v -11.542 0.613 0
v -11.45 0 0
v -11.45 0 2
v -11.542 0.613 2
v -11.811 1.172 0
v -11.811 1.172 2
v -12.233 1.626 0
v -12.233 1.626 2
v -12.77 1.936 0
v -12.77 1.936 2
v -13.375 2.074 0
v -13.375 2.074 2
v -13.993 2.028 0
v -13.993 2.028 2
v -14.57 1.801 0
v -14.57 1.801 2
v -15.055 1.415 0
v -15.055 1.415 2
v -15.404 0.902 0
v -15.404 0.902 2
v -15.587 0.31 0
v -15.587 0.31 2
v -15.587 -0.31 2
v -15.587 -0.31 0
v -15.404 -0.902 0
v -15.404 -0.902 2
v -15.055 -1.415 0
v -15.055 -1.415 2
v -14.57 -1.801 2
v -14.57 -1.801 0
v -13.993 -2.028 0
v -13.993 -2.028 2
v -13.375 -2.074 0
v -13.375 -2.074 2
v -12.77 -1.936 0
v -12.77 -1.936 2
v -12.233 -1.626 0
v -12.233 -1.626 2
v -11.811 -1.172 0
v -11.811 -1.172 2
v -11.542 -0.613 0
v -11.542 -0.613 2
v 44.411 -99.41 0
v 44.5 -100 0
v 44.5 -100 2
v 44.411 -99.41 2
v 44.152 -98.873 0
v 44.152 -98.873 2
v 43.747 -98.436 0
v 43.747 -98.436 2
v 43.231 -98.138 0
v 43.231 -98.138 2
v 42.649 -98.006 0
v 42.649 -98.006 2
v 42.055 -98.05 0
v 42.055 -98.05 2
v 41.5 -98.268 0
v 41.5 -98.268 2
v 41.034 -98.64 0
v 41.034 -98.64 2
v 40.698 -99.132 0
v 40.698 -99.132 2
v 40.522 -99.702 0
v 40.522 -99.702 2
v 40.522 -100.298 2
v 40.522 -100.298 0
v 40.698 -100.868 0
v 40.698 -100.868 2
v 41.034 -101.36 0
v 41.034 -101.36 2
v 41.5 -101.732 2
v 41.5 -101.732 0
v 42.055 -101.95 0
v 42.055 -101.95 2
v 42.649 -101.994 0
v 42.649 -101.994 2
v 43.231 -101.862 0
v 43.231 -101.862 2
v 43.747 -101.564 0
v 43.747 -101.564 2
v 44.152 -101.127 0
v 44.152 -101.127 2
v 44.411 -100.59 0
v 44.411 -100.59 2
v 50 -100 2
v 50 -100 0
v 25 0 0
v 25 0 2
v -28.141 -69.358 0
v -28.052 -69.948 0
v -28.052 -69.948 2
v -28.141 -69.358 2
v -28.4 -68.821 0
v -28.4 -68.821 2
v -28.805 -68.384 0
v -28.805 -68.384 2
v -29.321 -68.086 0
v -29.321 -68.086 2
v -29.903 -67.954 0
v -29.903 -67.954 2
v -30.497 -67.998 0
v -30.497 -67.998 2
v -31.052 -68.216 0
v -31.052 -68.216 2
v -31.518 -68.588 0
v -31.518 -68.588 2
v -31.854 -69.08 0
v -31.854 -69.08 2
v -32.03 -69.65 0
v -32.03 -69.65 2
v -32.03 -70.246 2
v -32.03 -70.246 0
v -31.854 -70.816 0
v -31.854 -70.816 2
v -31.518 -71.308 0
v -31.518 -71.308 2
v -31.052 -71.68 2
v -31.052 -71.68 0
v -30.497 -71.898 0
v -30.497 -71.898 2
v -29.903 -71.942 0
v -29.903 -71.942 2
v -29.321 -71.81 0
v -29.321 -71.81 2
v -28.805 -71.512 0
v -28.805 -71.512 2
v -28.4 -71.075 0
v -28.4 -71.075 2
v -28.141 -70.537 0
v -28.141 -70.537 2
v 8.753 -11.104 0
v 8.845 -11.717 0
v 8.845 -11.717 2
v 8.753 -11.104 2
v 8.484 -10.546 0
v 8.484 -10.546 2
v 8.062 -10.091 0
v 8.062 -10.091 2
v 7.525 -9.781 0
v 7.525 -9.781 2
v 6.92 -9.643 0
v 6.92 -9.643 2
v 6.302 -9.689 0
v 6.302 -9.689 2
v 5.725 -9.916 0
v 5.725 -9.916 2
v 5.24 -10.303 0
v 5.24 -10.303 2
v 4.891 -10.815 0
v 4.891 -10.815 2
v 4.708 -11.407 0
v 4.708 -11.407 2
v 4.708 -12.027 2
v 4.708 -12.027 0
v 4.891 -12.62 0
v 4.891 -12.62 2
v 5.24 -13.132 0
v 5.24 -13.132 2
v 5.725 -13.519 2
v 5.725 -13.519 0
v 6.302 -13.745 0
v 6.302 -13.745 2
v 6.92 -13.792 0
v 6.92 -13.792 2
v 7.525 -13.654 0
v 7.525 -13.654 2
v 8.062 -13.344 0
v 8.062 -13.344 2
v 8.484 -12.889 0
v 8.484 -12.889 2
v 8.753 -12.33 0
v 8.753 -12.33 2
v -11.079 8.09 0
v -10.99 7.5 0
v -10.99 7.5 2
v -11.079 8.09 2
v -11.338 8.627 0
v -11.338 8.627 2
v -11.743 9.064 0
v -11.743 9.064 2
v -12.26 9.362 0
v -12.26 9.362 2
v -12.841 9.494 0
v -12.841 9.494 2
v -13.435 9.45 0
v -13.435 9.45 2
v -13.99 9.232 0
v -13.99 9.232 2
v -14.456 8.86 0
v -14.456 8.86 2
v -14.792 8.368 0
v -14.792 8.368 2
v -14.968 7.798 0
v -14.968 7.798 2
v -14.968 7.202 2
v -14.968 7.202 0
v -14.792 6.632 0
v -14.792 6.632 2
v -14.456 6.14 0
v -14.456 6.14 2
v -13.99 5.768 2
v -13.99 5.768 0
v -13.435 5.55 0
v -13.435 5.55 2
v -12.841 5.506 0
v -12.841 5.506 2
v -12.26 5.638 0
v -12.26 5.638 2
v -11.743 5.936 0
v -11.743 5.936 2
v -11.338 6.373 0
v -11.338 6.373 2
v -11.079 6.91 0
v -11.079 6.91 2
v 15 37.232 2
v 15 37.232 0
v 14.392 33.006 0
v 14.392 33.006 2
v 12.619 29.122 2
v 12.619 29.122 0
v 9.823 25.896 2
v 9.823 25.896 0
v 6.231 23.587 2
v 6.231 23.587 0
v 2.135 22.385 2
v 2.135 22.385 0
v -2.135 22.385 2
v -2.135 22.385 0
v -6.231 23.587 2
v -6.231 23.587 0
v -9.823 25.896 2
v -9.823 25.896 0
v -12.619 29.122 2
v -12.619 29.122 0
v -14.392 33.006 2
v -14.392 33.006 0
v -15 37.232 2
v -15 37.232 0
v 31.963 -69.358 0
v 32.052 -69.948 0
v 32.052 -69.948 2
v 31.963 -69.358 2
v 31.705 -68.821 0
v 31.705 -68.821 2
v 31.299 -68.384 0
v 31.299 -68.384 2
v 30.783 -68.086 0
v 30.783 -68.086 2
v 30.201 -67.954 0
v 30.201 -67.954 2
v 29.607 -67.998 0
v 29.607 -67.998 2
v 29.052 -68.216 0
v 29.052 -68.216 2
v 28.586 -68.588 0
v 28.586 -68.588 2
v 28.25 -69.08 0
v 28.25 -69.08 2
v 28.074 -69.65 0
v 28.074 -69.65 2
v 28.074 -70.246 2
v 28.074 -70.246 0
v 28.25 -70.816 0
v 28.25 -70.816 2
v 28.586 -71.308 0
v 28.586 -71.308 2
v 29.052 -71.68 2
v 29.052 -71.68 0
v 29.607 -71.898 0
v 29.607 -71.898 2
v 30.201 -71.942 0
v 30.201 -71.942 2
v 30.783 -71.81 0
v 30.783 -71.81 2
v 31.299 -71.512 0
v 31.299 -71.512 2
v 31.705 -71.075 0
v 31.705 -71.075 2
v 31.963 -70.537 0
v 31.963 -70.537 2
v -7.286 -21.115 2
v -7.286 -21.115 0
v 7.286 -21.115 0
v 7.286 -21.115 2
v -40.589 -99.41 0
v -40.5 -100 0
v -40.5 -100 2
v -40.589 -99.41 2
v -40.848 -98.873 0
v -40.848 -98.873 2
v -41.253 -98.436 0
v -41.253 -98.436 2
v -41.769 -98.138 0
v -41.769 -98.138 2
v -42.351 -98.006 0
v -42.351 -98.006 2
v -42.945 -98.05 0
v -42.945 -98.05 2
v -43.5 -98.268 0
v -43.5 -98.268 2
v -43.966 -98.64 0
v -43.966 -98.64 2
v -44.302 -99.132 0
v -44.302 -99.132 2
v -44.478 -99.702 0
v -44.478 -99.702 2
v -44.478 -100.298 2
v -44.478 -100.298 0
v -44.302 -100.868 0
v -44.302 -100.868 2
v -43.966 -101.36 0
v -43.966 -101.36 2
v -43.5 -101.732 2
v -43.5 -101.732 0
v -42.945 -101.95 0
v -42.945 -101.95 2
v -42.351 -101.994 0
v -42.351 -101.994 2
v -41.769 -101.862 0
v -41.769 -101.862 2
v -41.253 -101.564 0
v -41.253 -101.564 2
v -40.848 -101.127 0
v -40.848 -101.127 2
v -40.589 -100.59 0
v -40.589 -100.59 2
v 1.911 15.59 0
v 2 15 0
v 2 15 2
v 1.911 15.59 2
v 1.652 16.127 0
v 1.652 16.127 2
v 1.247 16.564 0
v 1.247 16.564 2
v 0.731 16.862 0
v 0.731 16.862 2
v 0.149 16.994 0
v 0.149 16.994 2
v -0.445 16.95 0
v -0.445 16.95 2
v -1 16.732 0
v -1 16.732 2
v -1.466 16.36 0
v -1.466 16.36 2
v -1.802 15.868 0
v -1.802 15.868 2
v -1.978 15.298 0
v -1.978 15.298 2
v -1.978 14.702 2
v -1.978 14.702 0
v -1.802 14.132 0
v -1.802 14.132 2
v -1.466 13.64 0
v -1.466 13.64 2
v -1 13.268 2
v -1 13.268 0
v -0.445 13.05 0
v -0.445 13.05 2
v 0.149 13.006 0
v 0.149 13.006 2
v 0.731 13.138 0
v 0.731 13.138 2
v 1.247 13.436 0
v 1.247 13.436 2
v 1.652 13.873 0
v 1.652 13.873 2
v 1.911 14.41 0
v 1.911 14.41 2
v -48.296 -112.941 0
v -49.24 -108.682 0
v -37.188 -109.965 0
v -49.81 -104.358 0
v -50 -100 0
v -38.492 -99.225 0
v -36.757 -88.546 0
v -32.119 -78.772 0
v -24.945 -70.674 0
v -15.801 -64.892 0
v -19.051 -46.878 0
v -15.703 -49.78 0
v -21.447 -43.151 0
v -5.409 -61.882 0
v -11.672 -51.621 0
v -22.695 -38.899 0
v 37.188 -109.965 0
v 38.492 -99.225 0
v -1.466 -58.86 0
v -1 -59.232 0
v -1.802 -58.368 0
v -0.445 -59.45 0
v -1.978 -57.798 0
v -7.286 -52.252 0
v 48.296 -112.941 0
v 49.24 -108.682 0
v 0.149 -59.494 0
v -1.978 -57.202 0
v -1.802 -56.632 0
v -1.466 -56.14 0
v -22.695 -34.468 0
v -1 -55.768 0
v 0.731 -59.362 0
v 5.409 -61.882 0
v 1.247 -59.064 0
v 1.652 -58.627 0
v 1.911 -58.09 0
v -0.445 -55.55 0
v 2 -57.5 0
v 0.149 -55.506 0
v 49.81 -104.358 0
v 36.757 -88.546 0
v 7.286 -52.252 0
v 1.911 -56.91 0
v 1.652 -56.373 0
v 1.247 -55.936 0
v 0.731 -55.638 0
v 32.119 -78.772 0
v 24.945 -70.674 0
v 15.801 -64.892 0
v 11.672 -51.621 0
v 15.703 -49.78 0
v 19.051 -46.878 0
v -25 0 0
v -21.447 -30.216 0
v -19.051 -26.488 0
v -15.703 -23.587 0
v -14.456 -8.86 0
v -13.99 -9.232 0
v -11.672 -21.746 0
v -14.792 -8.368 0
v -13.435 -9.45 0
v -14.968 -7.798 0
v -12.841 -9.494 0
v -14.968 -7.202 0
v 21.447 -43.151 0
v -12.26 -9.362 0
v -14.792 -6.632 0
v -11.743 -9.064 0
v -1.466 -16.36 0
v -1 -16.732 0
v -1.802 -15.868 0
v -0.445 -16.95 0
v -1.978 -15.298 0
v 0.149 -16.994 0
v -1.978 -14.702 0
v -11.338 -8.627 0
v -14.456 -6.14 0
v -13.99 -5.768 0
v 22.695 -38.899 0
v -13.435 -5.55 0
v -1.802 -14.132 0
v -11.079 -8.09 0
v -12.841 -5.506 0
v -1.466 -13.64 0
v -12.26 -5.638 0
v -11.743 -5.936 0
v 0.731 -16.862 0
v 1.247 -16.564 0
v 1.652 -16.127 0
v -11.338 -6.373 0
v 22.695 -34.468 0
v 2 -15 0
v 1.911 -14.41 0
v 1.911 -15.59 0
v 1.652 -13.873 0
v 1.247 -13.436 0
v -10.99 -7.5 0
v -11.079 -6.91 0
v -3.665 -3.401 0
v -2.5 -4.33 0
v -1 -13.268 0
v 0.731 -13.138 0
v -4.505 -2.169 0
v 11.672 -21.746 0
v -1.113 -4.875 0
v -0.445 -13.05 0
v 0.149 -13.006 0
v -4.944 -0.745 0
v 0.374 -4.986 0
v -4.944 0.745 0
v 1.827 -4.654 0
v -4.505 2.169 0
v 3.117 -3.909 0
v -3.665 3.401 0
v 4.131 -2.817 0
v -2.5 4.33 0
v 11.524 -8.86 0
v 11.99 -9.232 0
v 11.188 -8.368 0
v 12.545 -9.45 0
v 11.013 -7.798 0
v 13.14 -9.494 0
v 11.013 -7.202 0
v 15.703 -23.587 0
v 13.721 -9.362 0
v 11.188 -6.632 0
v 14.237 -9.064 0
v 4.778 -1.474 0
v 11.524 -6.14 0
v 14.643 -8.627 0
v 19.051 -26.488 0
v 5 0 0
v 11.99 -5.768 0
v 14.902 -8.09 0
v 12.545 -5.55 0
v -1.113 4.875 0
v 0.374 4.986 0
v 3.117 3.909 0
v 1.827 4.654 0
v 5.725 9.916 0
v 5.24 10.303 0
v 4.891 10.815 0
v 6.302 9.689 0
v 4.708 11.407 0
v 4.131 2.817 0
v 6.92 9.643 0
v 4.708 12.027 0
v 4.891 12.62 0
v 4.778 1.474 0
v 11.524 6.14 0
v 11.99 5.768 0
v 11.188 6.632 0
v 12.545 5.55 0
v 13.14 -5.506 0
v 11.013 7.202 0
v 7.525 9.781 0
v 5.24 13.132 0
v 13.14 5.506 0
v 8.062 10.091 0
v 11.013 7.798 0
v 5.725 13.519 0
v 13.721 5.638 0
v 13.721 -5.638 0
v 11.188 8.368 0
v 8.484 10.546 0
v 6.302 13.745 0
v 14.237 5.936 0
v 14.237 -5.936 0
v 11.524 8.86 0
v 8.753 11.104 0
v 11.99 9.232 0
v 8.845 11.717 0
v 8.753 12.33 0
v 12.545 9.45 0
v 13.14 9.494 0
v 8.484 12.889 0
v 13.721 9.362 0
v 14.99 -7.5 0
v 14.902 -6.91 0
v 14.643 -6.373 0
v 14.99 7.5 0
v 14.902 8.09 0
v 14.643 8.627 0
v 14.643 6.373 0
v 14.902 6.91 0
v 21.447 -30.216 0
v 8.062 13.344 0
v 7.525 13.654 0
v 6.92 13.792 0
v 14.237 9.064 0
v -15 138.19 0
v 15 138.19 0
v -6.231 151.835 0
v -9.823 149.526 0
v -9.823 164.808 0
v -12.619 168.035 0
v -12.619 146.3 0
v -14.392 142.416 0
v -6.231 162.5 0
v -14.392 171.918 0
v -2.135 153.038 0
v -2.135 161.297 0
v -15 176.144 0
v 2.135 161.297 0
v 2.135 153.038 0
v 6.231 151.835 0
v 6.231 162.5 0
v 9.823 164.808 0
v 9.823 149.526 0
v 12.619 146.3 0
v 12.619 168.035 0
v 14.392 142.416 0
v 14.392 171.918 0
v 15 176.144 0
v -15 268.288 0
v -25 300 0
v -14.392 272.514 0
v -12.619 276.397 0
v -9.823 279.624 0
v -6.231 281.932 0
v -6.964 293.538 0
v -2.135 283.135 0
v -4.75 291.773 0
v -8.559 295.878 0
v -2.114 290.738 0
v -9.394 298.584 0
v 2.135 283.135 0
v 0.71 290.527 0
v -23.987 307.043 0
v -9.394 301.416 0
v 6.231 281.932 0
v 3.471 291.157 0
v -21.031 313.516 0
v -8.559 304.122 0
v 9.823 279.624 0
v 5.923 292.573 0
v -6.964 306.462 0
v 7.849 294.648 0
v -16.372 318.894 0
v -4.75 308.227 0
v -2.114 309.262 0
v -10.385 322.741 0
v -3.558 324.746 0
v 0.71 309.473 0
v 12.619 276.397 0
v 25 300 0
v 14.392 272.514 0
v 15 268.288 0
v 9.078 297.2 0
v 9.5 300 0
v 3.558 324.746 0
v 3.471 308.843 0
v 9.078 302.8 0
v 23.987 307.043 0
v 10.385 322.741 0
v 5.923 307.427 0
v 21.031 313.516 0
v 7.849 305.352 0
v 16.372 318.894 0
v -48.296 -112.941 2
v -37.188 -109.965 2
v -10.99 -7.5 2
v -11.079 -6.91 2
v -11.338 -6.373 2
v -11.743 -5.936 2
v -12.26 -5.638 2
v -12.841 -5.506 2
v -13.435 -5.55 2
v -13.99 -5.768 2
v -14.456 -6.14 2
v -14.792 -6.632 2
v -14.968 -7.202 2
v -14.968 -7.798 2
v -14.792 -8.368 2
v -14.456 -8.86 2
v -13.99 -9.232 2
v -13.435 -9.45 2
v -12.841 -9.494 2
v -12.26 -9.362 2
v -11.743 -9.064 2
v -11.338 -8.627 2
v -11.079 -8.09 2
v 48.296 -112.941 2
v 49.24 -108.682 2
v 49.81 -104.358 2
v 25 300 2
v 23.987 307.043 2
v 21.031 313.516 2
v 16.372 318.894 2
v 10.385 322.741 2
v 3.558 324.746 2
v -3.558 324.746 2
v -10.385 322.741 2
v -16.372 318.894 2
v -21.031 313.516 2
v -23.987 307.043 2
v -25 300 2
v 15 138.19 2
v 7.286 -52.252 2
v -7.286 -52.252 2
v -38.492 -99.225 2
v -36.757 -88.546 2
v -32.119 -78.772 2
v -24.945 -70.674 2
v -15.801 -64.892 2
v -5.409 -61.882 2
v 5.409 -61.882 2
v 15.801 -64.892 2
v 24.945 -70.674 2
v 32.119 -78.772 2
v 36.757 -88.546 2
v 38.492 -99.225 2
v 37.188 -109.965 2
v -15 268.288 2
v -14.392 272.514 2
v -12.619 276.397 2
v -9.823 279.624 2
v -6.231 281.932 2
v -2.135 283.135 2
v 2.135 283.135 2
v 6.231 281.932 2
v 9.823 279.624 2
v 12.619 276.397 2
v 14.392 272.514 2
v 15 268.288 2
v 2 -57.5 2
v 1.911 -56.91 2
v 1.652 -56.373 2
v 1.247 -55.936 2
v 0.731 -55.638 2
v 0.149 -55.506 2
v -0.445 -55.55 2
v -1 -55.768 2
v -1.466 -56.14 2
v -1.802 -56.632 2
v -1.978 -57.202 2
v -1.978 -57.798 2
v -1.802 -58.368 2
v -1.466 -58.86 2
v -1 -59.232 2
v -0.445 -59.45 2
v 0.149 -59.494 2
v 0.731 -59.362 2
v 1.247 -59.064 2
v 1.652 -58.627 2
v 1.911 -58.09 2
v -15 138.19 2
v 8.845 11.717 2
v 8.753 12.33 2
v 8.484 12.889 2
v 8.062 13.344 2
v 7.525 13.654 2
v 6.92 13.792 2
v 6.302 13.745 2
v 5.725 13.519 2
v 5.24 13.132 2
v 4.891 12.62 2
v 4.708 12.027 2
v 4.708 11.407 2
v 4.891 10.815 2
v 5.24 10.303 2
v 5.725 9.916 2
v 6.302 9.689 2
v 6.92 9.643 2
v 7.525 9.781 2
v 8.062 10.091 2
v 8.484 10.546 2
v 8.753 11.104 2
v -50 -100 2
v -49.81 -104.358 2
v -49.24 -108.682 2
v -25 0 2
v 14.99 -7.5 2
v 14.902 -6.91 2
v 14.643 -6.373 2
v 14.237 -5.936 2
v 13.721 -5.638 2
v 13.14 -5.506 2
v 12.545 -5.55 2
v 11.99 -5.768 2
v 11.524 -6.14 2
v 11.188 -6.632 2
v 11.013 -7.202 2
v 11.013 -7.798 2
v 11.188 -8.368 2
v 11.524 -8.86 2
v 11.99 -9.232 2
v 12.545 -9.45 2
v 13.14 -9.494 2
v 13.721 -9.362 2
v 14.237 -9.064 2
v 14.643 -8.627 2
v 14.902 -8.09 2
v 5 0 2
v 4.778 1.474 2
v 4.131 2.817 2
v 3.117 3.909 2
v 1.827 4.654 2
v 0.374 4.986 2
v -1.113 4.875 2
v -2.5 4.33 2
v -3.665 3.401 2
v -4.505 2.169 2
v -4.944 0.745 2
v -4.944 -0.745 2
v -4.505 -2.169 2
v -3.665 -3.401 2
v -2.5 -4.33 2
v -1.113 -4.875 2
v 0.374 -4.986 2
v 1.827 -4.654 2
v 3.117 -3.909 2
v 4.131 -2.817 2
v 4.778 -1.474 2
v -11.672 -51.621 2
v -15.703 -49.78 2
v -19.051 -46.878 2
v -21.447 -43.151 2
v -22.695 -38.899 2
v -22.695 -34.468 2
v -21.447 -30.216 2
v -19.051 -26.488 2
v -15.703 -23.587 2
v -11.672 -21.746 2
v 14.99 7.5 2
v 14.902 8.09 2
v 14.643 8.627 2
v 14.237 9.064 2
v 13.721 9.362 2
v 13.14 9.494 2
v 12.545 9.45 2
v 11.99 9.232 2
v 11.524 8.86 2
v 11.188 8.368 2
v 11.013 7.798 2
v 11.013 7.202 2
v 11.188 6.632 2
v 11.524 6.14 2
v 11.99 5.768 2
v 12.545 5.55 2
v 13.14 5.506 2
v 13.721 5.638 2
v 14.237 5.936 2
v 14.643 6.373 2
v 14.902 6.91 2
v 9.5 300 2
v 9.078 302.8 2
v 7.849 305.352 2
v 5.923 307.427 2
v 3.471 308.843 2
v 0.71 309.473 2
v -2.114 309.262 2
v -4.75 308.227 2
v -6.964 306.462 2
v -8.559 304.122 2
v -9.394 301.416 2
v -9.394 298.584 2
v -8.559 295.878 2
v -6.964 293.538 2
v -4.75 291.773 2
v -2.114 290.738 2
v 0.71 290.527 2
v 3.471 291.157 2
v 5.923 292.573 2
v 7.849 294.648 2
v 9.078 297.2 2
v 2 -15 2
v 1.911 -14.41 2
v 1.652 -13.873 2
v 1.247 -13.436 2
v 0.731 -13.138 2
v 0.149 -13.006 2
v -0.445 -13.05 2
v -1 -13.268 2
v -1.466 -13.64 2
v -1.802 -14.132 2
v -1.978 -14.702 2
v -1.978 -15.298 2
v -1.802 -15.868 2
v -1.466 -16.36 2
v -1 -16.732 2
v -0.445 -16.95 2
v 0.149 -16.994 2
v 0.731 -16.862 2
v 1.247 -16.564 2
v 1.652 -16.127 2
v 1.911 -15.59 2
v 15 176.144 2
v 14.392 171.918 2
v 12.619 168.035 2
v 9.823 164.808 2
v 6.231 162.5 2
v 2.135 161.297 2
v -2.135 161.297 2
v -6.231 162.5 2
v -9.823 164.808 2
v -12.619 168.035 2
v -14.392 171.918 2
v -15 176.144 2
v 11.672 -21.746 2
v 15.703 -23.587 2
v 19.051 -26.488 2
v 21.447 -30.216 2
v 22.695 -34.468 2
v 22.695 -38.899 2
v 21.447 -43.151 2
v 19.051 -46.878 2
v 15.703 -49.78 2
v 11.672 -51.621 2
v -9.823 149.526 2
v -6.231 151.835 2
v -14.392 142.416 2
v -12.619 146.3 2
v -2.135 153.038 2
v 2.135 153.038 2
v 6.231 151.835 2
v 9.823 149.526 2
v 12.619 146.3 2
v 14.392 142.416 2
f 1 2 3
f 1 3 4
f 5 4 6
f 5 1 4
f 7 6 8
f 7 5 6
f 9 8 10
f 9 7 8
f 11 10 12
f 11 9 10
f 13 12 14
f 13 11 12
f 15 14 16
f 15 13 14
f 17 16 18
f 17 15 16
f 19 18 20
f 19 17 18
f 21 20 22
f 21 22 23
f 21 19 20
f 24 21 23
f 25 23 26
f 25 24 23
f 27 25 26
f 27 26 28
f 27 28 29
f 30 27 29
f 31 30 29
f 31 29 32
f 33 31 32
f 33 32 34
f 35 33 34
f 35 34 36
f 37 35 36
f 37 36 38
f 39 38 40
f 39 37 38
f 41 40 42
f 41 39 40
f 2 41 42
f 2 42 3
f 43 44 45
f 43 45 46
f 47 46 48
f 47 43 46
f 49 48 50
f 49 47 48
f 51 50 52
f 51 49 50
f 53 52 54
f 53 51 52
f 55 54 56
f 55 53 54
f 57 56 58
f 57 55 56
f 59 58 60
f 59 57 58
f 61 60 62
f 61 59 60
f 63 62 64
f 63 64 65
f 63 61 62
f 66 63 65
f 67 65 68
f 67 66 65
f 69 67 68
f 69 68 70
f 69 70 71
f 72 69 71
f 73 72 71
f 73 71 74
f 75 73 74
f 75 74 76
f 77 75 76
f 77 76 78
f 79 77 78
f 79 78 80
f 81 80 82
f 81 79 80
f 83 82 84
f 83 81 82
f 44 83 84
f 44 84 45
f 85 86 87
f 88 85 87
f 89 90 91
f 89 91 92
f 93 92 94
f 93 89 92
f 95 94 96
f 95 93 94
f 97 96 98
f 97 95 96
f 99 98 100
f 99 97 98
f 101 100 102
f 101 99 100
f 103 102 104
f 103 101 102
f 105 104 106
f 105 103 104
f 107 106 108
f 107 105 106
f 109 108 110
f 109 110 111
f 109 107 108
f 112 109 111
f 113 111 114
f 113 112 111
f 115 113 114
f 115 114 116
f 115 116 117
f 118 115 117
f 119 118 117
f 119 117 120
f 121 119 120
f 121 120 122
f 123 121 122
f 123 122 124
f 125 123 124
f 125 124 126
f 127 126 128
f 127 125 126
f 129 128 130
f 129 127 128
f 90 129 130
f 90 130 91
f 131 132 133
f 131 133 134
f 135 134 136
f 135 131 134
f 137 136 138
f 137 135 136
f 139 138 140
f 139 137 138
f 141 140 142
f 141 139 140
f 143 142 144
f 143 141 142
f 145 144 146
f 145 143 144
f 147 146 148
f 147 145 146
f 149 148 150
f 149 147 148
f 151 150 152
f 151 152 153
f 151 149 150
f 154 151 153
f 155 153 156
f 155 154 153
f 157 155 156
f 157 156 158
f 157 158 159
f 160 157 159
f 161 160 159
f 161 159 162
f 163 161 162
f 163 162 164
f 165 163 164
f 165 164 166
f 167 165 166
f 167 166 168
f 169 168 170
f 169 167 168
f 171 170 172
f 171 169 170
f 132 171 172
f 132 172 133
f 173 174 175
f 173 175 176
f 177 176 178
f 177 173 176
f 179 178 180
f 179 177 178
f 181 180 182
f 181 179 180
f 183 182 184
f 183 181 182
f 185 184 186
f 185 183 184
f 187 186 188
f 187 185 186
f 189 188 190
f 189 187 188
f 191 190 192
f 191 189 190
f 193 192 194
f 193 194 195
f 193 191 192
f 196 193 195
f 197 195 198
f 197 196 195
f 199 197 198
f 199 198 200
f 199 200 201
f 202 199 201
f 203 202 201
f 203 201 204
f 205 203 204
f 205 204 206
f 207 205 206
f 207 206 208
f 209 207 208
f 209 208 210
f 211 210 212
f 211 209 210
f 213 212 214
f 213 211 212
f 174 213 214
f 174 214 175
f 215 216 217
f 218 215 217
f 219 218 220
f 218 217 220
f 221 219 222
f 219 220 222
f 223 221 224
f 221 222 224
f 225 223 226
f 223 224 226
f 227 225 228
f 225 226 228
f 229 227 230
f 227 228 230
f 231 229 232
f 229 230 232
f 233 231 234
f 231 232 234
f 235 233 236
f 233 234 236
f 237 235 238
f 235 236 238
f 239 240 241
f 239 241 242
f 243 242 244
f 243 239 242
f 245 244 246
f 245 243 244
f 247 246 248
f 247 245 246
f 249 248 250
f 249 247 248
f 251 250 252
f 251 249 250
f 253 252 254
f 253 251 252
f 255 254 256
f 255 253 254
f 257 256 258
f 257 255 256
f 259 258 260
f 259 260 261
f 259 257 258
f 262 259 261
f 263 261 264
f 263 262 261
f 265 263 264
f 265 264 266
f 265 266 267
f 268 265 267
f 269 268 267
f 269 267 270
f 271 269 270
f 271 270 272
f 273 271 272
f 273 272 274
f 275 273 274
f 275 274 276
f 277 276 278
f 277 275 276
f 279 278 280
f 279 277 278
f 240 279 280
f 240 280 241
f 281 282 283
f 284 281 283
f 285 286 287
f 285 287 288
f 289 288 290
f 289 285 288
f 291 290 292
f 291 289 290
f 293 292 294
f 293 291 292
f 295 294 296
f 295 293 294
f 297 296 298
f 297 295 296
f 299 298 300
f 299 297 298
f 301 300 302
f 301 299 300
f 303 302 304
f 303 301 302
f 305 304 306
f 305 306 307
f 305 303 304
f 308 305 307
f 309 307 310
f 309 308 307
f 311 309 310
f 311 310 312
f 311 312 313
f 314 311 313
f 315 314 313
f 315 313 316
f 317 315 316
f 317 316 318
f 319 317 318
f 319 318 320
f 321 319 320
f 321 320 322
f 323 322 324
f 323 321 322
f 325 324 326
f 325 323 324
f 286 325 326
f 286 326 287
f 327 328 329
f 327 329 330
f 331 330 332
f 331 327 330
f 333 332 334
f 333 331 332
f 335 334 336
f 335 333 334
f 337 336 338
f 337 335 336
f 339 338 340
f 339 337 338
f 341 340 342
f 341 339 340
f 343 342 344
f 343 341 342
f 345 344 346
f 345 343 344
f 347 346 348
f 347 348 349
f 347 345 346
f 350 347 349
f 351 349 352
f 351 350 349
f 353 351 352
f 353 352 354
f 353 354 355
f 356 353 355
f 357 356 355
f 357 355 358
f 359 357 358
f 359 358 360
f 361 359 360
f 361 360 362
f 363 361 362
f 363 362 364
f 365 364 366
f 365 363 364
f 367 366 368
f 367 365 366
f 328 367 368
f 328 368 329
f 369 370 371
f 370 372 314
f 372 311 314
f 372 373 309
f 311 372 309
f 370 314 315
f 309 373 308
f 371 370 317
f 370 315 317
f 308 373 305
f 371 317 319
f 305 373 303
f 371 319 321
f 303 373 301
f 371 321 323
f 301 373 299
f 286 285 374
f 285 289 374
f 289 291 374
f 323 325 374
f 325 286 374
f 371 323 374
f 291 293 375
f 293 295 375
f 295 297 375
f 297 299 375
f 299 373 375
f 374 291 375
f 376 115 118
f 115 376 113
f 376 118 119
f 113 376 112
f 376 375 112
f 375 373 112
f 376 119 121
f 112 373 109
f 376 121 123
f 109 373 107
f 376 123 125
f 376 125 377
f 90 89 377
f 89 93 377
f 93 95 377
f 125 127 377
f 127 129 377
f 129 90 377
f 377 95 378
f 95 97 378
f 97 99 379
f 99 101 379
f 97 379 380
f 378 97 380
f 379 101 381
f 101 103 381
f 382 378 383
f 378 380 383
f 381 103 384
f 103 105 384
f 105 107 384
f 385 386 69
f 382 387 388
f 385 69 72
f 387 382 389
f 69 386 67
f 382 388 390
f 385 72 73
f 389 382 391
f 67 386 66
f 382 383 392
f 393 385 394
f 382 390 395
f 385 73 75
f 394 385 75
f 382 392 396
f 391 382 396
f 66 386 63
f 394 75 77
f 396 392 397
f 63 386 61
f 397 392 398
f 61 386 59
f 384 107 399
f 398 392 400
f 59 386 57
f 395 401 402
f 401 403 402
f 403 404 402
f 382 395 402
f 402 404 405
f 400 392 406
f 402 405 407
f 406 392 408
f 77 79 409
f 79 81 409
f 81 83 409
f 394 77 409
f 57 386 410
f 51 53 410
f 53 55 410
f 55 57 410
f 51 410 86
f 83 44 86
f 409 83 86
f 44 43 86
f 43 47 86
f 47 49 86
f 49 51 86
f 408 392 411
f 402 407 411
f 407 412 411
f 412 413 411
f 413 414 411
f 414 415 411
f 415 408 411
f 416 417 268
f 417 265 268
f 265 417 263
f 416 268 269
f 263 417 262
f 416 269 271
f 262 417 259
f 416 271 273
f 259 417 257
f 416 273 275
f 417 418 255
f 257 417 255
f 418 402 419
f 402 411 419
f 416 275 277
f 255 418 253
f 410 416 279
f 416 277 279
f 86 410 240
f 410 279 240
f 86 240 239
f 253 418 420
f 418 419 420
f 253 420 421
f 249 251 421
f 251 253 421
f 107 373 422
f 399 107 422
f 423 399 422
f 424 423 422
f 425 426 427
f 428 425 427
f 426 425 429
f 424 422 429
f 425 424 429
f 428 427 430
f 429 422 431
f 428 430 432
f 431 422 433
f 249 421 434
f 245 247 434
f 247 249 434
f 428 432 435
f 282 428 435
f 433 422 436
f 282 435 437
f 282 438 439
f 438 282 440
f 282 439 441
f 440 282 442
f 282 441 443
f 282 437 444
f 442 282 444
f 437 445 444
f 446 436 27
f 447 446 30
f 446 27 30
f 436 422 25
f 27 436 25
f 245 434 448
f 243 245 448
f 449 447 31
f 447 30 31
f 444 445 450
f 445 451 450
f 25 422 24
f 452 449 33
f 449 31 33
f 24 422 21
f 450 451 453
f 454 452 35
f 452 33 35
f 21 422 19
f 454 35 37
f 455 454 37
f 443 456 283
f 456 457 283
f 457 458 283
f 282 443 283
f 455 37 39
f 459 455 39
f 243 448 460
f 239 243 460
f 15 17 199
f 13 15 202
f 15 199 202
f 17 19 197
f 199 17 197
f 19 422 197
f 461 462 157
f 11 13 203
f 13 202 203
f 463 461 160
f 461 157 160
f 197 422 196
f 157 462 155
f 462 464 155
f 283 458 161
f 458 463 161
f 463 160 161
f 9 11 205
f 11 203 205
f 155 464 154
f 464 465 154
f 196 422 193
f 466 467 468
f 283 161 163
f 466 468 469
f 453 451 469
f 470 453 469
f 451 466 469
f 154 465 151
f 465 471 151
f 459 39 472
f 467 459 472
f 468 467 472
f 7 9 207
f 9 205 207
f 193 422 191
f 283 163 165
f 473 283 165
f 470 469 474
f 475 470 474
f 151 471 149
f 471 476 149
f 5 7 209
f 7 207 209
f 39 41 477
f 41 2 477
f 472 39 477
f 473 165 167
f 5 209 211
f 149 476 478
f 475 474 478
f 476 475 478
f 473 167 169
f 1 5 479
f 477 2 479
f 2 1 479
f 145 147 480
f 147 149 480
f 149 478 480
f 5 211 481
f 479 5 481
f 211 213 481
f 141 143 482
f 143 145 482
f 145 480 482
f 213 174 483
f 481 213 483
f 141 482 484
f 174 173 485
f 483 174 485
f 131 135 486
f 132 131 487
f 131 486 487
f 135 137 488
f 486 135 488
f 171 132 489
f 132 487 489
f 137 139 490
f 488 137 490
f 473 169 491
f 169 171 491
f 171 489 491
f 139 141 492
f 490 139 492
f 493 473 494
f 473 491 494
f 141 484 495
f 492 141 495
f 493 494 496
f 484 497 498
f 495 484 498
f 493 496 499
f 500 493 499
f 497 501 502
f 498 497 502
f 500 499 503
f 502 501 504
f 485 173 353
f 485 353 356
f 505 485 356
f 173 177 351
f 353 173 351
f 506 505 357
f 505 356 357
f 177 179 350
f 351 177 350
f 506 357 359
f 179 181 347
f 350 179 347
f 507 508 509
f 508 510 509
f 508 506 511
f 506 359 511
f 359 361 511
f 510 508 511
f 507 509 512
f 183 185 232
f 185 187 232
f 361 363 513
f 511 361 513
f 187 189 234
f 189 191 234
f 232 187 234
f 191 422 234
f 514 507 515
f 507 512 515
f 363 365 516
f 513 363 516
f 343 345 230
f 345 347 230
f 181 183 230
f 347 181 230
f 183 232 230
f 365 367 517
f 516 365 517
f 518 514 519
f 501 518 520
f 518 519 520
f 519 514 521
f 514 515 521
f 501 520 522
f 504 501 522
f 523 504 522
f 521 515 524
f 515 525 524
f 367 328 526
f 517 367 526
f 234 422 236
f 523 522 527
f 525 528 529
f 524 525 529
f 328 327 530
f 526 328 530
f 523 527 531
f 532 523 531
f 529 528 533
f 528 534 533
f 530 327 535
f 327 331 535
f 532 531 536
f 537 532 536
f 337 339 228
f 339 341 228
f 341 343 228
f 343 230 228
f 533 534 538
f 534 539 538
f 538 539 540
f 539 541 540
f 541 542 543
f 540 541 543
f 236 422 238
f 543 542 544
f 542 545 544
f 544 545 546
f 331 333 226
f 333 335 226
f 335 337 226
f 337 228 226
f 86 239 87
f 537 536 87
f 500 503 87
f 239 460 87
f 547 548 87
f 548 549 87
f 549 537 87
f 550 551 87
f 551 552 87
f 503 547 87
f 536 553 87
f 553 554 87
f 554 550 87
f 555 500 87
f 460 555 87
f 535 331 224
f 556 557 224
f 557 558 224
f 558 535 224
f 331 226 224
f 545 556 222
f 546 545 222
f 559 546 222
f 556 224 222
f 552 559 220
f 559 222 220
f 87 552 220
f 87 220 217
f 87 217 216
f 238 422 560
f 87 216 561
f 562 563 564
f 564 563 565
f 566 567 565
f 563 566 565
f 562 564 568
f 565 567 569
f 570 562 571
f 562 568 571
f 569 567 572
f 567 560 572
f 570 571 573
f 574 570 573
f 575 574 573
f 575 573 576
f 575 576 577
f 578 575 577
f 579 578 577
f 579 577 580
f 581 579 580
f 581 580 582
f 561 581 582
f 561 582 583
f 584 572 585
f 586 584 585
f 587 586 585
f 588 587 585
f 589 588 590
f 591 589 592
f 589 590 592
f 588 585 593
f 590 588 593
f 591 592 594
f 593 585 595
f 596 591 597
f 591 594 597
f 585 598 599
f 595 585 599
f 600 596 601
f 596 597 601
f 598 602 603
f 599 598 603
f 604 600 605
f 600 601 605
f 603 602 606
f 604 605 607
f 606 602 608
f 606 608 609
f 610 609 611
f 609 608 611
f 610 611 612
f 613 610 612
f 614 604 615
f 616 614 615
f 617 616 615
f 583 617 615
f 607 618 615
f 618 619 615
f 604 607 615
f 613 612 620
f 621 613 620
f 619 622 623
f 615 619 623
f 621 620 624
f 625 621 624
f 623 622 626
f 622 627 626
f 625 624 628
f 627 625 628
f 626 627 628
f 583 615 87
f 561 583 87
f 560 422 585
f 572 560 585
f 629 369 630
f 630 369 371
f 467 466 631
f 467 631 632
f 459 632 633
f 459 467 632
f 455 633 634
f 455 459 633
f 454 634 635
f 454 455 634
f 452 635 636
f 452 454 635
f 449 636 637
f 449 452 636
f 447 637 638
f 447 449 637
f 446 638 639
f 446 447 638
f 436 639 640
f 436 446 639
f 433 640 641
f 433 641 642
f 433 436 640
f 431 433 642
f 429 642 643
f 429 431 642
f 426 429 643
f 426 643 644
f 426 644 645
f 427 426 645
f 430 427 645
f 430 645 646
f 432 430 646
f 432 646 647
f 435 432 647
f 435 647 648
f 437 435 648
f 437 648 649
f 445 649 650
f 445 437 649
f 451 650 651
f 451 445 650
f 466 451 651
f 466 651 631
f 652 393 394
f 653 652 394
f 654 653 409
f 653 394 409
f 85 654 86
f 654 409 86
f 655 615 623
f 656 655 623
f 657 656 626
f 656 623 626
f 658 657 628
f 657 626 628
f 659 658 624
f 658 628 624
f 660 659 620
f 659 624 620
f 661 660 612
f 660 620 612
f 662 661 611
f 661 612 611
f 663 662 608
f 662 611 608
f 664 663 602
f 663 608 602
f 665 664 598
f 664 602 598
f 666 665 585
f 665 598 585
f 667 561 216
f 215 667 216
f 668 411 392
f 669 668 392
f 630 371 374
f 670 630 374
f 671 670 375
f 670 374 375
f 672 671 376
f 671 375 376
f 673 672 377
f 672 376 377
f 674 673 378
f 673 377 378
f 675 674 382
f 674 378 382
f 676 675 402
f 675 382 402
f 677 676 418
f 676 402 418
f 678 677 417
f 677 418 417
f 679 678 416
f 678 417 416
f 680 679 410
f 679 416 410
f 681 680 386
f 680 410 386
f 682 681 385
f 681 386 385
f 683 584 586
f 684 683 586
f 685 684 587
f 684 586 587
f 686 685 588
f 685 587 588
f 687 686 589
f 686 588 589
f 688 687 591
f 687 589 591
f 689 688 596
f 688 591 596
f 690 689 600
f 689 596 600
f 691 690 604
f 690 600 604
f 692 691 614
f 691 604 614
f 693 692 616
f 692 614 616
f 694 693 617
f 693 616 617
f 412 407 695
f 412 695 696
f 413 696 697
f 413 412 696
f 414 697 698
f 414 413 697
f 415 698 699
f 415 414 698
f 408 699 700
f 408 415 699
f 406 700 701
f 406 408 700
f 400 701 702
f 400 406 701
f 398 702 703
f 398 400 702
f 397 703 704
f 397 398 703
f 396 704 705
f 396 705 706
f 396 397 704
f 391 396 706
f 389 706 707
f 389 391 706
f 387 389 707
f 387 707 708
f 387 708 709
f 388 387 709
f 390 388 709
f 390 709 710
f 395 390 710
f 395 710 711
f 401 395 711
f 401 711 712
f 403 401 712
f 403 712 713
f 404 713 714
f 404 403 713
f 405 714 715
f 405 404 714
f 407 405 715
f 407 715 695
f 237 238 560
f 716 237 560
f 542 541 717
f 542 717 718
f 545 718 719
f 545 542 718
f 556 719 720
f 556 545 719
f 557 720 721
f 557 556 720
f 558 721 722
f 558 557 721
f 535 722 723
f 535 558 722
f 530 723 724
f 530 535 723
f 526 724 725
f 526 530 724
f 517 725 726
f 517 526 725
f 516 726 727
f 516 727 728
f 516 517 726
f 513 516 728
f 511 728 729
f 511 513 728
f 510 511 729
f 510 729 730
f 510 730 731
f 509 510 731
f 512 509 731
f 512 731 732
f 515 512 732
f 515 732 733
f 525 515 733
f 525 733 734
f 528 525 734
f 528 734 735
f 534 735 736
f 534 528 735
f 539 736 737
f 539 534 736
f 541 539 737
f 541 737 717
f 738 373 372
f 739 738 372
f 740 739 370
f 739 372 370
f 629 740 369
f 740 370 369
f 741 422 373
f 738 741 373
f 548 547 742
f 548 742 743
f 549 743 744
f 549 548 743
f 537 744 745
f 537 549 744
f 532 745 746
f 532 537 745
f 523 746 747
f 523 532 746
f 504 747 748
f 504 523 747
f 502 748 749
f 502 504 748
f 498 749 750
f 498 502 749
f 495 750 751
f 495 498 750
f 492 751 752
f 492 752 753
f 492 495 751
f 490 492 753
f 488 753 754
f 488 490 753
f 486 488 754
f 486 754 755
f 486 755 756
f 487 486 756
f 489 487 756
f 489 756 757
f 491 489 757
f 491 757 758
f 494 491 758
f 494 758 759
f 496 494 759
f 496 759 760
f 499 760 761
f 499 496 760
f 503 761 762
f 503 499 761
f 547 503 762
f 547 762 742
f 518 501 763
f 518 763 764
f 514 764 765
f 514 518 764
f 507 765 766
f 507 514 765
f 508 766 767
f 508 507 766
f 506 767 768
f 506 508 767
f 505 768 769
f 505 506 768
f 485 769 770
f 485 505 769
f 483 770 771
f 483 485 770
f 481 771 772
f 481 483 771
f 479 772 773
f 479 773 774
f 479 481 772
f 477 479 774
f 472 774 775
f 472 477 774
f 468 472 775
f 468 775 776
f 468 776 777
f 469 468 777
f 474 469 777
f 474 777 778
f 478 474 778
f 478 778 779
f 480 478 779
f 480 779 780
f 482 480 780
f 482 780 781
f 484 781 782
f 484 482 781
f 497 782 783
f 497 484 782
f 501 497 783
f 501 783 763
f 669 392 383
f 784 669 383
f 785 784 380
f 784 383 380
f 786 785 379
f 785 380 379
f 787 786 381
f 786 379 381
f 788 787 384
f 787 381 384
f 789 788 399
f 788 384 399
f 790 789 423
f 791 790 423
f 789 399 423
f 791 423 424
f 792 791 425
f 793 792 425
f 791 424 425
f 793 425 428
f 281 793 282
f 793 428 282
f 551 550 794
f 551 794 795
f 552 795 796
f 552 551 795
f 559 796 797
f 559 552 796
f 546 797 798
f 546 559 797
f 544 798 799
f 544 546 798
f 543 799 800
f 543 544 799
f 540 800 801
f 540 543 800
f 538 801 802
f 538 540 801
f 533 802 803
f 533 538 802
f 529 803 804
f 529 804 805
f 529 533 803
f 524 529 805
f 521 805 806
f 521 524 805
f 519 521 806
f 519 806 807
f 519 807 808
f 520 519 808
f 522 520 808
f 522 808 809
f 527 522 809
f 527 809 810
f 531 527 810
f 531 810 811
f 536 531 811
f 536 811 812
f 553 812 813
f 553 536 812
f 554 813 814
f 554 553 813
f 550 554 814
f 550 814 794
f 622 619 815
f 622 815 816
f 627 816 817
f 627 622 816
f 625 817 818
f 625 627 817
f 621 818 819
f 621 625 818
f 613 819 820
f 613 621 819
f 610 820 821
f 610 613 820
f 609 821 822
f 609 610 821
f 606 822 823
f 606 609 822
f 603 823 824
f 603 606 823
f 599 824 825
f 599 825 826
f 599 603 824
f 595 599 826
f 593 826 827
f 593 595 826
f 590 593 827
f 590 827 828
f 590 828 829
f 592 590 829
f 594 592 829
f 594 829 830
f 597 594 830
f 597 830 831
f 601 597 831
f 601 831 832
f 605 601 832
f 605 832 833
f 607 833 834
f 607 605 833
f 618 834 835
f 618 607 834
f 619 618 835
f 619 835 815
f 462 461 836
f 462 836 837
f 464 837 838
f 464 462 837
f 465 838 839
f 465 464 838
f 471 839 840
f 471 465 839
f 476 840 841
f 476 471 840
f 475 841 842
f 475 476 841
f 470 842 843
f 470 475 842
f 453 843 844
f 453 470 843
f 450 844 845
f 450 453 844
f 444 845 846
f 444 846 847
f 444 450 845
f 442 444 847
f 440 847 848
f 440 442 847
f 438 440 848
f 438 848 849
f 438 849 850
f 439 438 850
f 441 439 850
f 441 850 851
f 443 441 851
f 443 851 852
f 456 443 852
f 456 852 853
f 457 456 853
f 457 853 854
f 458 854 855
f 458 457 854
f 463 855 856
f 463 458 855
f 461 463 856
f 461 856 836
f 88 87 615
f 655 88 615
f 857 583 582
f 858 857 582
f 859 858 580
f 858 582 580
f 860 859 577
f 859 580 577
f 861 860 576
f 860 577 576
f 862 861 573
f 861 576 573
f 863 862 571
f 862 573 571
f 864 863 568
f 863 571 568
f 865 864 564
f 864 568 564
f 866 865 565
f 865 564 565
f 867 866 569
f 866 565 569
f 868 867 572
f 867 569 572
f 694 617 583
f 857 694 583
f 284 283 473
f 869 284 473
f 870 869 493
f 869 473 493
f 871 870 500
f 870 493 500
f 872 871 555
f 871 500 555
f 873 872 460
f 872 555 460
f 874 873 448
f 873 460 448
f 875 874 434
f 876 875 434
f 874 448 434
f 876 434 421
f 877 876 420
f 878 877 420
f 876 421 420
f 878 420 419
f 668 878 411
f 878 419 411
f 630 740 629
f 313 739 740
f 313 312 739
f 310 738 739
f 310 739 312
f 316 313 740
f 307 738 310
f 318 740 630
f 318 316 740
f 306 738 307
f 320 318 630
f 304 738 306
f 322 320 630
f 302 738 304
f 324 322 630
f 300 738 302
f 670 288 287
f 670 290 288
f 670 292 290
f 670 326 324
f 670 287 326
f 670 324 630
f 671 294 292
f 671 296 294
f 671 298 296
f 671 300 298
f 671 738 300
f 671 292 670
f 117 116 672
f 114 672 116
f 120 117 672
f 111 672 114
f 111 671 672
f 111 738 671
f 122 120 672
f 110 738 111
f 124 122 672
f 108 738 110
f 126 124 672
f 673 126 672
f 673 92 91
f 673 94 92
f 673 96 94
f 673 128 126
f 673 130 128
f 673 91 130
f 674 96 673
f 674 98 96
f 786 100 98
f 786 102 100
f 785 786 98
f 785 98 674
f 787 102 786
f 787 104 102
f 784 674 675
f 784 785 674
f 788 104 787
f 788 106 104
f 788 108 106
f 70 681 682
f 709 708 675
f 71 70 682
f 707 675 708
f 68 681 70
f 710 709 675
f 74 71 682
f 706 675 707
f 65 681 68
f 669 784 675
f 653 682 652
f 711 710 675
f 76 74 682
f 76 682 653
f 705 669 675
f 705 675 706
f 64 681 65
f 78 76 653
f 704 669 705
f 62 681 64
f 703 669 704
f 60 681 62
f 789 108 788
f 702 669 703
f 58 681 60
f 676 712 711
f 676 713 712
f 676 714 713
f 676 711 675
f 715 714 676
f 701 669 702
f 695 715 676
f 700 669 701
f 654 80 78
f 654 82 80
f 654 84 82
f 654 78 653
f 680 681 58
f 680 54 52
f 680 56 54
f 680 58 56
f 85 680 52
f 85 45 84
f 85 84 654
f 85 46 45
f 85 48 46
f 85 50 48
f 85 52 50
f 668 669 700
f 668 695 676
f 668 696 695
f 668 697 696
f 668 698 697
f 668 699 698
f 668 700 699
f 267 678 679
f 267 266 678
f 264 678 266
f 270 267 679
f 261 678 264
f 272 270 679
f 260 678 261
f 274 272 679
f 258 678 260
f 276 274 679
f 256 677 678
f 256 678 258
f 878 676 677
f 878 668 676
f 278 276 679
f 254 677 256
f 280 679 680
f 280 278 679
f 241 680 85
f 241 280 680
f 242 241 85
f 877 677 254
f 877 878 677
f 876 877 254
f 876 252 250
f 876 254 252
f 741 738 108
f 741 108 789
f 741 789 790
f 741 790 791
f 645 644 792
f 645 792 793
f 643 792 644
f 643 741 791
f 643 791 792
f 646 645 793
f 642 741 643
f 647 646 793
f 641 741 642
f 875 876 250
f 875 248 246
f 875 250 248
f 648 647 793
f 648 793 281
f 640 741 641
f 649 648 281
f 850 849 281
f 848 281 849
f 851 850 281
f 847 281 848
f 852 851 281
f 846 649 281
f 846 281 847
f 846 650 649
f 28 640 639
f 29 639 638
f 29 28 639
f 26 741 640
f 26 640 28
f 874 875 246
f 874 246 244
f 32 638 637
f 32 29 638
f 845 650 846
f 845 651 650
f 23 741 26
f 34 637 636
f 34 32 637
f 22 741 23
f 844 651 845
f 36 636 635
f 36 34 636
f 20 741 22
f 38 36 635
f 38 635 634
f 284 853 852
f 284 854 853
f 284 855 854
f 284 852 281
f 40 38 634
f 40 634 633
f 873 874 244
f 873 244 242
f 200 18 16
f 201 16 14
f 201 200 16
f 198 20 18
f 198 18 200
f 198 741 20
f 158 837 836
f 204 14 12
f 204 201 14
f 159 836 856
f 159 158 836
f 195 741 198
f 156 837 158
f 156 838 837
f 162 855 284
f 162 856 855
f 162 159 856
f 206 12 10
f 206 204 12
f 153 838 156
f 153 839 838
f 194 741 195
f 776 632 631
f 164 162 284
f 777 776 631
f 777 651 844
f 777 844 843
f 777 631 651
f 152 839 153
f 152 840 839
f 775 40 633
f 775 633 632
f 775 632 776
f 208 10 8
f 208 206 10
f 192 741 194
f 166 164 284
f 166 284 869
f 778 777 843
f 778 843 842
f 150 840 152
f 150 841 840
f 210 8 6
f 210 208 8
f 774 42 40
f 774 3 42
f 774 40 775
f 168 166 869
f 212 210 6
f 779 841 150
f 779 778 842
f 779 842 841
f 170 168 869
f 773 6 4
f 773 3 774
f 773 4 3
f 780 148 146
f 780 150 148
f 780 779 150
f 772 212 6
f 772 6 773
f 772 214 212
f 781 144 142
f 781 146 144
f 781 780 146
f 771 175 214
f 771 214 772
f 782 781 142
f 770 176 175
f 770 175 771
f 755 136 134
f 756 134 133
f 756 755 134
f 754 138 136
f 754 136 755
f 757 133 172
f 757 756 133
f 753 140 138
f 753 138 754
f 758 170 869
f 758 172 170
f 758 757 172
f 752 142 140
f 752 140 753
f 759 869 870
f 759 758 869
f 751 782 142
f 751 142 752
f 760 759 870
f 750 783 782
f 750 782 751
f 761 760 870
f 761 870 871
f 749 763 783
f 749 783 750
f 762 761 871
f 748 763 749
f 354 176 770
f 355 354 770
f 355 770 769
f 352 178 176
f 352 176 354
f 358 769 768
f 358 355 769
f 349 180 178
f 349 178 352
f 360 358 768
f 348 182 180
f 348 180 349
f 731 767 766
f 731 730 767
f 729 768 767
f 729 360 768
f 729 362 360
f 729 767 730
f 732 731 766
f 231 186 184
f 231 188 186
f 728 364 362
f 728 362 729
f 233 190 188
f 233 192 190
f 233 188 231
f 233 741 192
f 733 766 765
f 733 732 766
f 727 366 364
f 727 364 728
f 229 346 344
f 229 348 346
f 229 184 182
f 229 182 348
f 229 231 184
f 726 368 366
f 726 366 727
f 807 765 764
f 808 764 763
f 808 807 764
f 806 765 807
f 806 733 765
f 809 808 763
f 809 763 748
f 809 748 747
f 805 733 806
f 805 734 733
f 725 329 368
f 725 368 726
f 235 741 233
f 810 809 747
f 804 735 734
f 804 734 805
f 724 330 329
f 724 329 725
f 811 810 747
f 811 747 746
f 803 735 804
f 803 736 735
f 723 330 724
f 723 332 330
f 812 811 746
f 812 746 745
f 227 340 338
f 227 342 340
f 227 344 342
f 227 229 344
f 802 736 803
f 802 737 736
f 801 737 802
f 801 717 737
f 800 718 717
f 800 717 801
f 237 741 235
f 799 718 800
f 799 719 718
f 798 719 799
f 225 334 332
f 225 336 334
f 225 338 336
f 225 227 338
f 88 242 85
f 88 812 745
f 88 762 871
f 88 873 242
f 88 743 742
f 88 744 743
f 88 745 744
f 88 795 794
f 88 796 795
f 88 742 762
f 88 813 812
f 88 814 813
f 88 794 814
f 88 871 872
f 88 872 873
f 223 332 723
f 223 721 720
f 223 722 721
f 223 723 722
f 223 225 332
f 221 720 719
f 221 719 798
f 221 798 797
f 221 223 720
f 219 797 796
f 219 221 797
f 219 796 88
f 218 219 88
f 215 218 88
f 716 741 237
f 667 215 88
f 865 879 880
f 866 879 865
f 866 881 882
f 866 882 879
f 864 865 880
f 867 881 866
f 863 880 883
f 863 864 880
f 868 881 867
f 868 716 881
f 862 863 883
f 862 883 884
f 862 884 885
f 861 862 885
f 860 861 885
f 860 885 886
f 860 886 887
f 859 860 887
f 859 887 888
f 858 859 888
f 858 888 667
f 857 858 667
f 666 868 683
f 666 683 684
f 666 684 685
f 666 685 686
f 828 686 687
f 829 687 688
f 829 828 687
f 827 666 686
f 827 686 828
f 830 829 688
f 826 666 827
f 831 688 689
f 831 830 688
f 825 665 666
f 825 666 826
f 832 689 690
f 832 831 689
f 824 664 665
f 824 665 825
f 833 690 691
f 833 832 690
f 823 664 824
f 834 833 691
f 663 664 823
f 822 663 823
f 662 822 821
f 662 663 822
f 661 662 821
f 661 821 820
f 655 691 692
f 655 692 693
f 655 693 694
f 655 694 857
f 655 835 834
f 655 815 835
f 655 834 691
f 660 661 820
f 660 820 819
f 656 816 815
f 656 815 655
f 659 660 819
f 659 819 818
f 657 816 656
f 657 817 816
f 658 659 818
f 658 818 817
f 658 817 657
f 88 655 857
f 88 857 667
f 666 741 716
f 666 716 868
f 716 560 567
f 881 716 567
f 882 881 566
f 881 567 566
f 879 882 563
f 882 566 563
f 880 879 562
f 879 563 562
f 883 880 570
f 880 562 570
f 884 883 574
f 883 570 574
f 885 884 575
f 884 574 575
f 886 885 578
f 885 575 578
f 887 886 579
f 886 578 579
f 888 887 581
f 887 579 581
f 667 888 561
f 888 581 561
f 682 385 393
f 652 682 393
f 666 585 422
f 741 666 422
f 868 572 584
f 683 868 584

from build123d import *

# Parameters (mm, degrees)
SKETCH_1_R      = 2
SKETCH_1_R_2    = 2.08
SKETCH_1_R_3    = 5
SKETCH_1_R_4    = 9.5
EXTRUDE_1_DEPTH = 2


with BuildPart() as part:
    # 草图1 → 凸台-拉伸1 (new body)
    with BuildSketch(Plane.XY):
        with BuildLine():
            Line((37.188144312, -109.964533236), (48.296291314, -112.940952255))
            ThreePointArc((48.296291314, -112.940952255), (49.572243069, -106.526309611), (50, -100))
            Line((50, -100), (25, 0))
            Line((25, 0), (25, 300))
            ThreePointArc((25, 300), (0, 325), (-25, 300))
            Line((-25, 300), (-25, 0))
            Line((-25, 0), (-50, -100))
            ThreePointArc((-50, -100), (-49.572243069, -106.526309611), (-48.296291314, -112.940952255))
            Line((-48.296291314, -112.940952255), (-37.188144312, -109.964533236))
            ThreePointArc((-37.188144312, -109.964533236), (0, -61.5), (37.188144312, -109.964533236))
        make_face()
        with Locations((0, -15)):
            Circle(SKETCH_1_R, mode=Mode.SUBTRACT)
        with Locations((-12.990381057, -7.5)):
            Circle(SKETCH_1_R, mode=Mode.SUBTRACT)
        with Locations((-12.990381057, 7.5)):
            Circle(SKETCH_1_R, mode=Mode.SUBTRACT)
        with Locations((0, 15)):
            Circle(SKETCH_1_R, mode=Mode.SUBTRACT)
        with Locations((12.990381057, 7.5)):
            Circle(SKETCH_1_R, mode=Mode.SUBTRACT)
        with Locations((12.990381057, -7.5)):
            Circle(SKETCH_1_R, mode=Mode.SUBTRACT)
        with Locations((-13.53, 0)):
            Circle(SKETCH_1_R_2, mode=Mode.SUBTRACT)
        with Locations((6.765, 11.717323713)):
            Circle(SKETCH_1_R_2, mode=Mode.SUBTRACT)
        with Locations((6.765, -11.717323713)):
            Circle(SKETCH_1_R_2, mode=Mode.SUBTRACT)
        Circle(SKETCH_1_R_3, mode=Mode.SUBTRACT)
        with Locations((-42.5, -100)):
            Circle(SKETCH_1_R, mode=Mode.SUBTRACT)
        with Locations((-30.0520382, -69.9479618)):
            Circle(SKETCH_1_R, mode=Mode.SUBTRACT)
        with Locations((0, -57.5)):
            Circle(SKETCH_1_R, mode=Mode.SUBTRACT)
        with Locations((30.0520382, -69.9479618)):
            Circle(SKETCH_1_R, mode=Mode.SUBTRACT)
        with Locations((42.5, -100)):
            Circle(SKETCH_1_R, mode=Mode.SUBTRACT)
        with Locations((0, 300)):
            Circle(SKETCH_1_R_4, mode=Mode.SUBTRACT)
        with BuildLine():
            Line((-15, 37.231839261), (-15, 138.190211212))
            ThreePointArc((-15, 138.190211212), (0, 153.190211212), (15, 138.190211212))
            Line((15, 138.190211212), (15, 37.231839261))
            ThreePointArc((15, 37.231839261), (0, 22.231839261), (-15, 37.231839261))
        make_face(mode=Mode.SUBTRACT)
        with BuildLine():
            Line((-7.285756476, -21.115181502), (7.285756476, -21.115181502))
            ThreePointArc((7.285756476, -21.115181502), (22.853925458, -36.683350484), (7.285756476, -52.251519465))
            Line((7.285756476, -52.251519465), (-7.285756476, -52.251519465))
            ThreePointArc((-7.285756476, -52.251519465), (-22.853925458, -36.683350484), (-7.285756476, -21.115181502))
        make_face(mode=Mode.SUBTRACT)
        with BuildLine():
            Line((-15, 176.144279665), (-15, 268.287785105))
            ThreePointArc((-15, 268.287785105), (0, 283.287785105), (15, 268.287785105))
            Line((15, 268.287785105), (15, 176.144279665))
            ThreePointArc((15, 176.144279665), (0, 161.144279665), (-15, 176.144279665))
        make_face(mode=Mode.SUBTRACT)
    extrude(amount=EXTRUDE_1_DEPTH)


solid = part.part
